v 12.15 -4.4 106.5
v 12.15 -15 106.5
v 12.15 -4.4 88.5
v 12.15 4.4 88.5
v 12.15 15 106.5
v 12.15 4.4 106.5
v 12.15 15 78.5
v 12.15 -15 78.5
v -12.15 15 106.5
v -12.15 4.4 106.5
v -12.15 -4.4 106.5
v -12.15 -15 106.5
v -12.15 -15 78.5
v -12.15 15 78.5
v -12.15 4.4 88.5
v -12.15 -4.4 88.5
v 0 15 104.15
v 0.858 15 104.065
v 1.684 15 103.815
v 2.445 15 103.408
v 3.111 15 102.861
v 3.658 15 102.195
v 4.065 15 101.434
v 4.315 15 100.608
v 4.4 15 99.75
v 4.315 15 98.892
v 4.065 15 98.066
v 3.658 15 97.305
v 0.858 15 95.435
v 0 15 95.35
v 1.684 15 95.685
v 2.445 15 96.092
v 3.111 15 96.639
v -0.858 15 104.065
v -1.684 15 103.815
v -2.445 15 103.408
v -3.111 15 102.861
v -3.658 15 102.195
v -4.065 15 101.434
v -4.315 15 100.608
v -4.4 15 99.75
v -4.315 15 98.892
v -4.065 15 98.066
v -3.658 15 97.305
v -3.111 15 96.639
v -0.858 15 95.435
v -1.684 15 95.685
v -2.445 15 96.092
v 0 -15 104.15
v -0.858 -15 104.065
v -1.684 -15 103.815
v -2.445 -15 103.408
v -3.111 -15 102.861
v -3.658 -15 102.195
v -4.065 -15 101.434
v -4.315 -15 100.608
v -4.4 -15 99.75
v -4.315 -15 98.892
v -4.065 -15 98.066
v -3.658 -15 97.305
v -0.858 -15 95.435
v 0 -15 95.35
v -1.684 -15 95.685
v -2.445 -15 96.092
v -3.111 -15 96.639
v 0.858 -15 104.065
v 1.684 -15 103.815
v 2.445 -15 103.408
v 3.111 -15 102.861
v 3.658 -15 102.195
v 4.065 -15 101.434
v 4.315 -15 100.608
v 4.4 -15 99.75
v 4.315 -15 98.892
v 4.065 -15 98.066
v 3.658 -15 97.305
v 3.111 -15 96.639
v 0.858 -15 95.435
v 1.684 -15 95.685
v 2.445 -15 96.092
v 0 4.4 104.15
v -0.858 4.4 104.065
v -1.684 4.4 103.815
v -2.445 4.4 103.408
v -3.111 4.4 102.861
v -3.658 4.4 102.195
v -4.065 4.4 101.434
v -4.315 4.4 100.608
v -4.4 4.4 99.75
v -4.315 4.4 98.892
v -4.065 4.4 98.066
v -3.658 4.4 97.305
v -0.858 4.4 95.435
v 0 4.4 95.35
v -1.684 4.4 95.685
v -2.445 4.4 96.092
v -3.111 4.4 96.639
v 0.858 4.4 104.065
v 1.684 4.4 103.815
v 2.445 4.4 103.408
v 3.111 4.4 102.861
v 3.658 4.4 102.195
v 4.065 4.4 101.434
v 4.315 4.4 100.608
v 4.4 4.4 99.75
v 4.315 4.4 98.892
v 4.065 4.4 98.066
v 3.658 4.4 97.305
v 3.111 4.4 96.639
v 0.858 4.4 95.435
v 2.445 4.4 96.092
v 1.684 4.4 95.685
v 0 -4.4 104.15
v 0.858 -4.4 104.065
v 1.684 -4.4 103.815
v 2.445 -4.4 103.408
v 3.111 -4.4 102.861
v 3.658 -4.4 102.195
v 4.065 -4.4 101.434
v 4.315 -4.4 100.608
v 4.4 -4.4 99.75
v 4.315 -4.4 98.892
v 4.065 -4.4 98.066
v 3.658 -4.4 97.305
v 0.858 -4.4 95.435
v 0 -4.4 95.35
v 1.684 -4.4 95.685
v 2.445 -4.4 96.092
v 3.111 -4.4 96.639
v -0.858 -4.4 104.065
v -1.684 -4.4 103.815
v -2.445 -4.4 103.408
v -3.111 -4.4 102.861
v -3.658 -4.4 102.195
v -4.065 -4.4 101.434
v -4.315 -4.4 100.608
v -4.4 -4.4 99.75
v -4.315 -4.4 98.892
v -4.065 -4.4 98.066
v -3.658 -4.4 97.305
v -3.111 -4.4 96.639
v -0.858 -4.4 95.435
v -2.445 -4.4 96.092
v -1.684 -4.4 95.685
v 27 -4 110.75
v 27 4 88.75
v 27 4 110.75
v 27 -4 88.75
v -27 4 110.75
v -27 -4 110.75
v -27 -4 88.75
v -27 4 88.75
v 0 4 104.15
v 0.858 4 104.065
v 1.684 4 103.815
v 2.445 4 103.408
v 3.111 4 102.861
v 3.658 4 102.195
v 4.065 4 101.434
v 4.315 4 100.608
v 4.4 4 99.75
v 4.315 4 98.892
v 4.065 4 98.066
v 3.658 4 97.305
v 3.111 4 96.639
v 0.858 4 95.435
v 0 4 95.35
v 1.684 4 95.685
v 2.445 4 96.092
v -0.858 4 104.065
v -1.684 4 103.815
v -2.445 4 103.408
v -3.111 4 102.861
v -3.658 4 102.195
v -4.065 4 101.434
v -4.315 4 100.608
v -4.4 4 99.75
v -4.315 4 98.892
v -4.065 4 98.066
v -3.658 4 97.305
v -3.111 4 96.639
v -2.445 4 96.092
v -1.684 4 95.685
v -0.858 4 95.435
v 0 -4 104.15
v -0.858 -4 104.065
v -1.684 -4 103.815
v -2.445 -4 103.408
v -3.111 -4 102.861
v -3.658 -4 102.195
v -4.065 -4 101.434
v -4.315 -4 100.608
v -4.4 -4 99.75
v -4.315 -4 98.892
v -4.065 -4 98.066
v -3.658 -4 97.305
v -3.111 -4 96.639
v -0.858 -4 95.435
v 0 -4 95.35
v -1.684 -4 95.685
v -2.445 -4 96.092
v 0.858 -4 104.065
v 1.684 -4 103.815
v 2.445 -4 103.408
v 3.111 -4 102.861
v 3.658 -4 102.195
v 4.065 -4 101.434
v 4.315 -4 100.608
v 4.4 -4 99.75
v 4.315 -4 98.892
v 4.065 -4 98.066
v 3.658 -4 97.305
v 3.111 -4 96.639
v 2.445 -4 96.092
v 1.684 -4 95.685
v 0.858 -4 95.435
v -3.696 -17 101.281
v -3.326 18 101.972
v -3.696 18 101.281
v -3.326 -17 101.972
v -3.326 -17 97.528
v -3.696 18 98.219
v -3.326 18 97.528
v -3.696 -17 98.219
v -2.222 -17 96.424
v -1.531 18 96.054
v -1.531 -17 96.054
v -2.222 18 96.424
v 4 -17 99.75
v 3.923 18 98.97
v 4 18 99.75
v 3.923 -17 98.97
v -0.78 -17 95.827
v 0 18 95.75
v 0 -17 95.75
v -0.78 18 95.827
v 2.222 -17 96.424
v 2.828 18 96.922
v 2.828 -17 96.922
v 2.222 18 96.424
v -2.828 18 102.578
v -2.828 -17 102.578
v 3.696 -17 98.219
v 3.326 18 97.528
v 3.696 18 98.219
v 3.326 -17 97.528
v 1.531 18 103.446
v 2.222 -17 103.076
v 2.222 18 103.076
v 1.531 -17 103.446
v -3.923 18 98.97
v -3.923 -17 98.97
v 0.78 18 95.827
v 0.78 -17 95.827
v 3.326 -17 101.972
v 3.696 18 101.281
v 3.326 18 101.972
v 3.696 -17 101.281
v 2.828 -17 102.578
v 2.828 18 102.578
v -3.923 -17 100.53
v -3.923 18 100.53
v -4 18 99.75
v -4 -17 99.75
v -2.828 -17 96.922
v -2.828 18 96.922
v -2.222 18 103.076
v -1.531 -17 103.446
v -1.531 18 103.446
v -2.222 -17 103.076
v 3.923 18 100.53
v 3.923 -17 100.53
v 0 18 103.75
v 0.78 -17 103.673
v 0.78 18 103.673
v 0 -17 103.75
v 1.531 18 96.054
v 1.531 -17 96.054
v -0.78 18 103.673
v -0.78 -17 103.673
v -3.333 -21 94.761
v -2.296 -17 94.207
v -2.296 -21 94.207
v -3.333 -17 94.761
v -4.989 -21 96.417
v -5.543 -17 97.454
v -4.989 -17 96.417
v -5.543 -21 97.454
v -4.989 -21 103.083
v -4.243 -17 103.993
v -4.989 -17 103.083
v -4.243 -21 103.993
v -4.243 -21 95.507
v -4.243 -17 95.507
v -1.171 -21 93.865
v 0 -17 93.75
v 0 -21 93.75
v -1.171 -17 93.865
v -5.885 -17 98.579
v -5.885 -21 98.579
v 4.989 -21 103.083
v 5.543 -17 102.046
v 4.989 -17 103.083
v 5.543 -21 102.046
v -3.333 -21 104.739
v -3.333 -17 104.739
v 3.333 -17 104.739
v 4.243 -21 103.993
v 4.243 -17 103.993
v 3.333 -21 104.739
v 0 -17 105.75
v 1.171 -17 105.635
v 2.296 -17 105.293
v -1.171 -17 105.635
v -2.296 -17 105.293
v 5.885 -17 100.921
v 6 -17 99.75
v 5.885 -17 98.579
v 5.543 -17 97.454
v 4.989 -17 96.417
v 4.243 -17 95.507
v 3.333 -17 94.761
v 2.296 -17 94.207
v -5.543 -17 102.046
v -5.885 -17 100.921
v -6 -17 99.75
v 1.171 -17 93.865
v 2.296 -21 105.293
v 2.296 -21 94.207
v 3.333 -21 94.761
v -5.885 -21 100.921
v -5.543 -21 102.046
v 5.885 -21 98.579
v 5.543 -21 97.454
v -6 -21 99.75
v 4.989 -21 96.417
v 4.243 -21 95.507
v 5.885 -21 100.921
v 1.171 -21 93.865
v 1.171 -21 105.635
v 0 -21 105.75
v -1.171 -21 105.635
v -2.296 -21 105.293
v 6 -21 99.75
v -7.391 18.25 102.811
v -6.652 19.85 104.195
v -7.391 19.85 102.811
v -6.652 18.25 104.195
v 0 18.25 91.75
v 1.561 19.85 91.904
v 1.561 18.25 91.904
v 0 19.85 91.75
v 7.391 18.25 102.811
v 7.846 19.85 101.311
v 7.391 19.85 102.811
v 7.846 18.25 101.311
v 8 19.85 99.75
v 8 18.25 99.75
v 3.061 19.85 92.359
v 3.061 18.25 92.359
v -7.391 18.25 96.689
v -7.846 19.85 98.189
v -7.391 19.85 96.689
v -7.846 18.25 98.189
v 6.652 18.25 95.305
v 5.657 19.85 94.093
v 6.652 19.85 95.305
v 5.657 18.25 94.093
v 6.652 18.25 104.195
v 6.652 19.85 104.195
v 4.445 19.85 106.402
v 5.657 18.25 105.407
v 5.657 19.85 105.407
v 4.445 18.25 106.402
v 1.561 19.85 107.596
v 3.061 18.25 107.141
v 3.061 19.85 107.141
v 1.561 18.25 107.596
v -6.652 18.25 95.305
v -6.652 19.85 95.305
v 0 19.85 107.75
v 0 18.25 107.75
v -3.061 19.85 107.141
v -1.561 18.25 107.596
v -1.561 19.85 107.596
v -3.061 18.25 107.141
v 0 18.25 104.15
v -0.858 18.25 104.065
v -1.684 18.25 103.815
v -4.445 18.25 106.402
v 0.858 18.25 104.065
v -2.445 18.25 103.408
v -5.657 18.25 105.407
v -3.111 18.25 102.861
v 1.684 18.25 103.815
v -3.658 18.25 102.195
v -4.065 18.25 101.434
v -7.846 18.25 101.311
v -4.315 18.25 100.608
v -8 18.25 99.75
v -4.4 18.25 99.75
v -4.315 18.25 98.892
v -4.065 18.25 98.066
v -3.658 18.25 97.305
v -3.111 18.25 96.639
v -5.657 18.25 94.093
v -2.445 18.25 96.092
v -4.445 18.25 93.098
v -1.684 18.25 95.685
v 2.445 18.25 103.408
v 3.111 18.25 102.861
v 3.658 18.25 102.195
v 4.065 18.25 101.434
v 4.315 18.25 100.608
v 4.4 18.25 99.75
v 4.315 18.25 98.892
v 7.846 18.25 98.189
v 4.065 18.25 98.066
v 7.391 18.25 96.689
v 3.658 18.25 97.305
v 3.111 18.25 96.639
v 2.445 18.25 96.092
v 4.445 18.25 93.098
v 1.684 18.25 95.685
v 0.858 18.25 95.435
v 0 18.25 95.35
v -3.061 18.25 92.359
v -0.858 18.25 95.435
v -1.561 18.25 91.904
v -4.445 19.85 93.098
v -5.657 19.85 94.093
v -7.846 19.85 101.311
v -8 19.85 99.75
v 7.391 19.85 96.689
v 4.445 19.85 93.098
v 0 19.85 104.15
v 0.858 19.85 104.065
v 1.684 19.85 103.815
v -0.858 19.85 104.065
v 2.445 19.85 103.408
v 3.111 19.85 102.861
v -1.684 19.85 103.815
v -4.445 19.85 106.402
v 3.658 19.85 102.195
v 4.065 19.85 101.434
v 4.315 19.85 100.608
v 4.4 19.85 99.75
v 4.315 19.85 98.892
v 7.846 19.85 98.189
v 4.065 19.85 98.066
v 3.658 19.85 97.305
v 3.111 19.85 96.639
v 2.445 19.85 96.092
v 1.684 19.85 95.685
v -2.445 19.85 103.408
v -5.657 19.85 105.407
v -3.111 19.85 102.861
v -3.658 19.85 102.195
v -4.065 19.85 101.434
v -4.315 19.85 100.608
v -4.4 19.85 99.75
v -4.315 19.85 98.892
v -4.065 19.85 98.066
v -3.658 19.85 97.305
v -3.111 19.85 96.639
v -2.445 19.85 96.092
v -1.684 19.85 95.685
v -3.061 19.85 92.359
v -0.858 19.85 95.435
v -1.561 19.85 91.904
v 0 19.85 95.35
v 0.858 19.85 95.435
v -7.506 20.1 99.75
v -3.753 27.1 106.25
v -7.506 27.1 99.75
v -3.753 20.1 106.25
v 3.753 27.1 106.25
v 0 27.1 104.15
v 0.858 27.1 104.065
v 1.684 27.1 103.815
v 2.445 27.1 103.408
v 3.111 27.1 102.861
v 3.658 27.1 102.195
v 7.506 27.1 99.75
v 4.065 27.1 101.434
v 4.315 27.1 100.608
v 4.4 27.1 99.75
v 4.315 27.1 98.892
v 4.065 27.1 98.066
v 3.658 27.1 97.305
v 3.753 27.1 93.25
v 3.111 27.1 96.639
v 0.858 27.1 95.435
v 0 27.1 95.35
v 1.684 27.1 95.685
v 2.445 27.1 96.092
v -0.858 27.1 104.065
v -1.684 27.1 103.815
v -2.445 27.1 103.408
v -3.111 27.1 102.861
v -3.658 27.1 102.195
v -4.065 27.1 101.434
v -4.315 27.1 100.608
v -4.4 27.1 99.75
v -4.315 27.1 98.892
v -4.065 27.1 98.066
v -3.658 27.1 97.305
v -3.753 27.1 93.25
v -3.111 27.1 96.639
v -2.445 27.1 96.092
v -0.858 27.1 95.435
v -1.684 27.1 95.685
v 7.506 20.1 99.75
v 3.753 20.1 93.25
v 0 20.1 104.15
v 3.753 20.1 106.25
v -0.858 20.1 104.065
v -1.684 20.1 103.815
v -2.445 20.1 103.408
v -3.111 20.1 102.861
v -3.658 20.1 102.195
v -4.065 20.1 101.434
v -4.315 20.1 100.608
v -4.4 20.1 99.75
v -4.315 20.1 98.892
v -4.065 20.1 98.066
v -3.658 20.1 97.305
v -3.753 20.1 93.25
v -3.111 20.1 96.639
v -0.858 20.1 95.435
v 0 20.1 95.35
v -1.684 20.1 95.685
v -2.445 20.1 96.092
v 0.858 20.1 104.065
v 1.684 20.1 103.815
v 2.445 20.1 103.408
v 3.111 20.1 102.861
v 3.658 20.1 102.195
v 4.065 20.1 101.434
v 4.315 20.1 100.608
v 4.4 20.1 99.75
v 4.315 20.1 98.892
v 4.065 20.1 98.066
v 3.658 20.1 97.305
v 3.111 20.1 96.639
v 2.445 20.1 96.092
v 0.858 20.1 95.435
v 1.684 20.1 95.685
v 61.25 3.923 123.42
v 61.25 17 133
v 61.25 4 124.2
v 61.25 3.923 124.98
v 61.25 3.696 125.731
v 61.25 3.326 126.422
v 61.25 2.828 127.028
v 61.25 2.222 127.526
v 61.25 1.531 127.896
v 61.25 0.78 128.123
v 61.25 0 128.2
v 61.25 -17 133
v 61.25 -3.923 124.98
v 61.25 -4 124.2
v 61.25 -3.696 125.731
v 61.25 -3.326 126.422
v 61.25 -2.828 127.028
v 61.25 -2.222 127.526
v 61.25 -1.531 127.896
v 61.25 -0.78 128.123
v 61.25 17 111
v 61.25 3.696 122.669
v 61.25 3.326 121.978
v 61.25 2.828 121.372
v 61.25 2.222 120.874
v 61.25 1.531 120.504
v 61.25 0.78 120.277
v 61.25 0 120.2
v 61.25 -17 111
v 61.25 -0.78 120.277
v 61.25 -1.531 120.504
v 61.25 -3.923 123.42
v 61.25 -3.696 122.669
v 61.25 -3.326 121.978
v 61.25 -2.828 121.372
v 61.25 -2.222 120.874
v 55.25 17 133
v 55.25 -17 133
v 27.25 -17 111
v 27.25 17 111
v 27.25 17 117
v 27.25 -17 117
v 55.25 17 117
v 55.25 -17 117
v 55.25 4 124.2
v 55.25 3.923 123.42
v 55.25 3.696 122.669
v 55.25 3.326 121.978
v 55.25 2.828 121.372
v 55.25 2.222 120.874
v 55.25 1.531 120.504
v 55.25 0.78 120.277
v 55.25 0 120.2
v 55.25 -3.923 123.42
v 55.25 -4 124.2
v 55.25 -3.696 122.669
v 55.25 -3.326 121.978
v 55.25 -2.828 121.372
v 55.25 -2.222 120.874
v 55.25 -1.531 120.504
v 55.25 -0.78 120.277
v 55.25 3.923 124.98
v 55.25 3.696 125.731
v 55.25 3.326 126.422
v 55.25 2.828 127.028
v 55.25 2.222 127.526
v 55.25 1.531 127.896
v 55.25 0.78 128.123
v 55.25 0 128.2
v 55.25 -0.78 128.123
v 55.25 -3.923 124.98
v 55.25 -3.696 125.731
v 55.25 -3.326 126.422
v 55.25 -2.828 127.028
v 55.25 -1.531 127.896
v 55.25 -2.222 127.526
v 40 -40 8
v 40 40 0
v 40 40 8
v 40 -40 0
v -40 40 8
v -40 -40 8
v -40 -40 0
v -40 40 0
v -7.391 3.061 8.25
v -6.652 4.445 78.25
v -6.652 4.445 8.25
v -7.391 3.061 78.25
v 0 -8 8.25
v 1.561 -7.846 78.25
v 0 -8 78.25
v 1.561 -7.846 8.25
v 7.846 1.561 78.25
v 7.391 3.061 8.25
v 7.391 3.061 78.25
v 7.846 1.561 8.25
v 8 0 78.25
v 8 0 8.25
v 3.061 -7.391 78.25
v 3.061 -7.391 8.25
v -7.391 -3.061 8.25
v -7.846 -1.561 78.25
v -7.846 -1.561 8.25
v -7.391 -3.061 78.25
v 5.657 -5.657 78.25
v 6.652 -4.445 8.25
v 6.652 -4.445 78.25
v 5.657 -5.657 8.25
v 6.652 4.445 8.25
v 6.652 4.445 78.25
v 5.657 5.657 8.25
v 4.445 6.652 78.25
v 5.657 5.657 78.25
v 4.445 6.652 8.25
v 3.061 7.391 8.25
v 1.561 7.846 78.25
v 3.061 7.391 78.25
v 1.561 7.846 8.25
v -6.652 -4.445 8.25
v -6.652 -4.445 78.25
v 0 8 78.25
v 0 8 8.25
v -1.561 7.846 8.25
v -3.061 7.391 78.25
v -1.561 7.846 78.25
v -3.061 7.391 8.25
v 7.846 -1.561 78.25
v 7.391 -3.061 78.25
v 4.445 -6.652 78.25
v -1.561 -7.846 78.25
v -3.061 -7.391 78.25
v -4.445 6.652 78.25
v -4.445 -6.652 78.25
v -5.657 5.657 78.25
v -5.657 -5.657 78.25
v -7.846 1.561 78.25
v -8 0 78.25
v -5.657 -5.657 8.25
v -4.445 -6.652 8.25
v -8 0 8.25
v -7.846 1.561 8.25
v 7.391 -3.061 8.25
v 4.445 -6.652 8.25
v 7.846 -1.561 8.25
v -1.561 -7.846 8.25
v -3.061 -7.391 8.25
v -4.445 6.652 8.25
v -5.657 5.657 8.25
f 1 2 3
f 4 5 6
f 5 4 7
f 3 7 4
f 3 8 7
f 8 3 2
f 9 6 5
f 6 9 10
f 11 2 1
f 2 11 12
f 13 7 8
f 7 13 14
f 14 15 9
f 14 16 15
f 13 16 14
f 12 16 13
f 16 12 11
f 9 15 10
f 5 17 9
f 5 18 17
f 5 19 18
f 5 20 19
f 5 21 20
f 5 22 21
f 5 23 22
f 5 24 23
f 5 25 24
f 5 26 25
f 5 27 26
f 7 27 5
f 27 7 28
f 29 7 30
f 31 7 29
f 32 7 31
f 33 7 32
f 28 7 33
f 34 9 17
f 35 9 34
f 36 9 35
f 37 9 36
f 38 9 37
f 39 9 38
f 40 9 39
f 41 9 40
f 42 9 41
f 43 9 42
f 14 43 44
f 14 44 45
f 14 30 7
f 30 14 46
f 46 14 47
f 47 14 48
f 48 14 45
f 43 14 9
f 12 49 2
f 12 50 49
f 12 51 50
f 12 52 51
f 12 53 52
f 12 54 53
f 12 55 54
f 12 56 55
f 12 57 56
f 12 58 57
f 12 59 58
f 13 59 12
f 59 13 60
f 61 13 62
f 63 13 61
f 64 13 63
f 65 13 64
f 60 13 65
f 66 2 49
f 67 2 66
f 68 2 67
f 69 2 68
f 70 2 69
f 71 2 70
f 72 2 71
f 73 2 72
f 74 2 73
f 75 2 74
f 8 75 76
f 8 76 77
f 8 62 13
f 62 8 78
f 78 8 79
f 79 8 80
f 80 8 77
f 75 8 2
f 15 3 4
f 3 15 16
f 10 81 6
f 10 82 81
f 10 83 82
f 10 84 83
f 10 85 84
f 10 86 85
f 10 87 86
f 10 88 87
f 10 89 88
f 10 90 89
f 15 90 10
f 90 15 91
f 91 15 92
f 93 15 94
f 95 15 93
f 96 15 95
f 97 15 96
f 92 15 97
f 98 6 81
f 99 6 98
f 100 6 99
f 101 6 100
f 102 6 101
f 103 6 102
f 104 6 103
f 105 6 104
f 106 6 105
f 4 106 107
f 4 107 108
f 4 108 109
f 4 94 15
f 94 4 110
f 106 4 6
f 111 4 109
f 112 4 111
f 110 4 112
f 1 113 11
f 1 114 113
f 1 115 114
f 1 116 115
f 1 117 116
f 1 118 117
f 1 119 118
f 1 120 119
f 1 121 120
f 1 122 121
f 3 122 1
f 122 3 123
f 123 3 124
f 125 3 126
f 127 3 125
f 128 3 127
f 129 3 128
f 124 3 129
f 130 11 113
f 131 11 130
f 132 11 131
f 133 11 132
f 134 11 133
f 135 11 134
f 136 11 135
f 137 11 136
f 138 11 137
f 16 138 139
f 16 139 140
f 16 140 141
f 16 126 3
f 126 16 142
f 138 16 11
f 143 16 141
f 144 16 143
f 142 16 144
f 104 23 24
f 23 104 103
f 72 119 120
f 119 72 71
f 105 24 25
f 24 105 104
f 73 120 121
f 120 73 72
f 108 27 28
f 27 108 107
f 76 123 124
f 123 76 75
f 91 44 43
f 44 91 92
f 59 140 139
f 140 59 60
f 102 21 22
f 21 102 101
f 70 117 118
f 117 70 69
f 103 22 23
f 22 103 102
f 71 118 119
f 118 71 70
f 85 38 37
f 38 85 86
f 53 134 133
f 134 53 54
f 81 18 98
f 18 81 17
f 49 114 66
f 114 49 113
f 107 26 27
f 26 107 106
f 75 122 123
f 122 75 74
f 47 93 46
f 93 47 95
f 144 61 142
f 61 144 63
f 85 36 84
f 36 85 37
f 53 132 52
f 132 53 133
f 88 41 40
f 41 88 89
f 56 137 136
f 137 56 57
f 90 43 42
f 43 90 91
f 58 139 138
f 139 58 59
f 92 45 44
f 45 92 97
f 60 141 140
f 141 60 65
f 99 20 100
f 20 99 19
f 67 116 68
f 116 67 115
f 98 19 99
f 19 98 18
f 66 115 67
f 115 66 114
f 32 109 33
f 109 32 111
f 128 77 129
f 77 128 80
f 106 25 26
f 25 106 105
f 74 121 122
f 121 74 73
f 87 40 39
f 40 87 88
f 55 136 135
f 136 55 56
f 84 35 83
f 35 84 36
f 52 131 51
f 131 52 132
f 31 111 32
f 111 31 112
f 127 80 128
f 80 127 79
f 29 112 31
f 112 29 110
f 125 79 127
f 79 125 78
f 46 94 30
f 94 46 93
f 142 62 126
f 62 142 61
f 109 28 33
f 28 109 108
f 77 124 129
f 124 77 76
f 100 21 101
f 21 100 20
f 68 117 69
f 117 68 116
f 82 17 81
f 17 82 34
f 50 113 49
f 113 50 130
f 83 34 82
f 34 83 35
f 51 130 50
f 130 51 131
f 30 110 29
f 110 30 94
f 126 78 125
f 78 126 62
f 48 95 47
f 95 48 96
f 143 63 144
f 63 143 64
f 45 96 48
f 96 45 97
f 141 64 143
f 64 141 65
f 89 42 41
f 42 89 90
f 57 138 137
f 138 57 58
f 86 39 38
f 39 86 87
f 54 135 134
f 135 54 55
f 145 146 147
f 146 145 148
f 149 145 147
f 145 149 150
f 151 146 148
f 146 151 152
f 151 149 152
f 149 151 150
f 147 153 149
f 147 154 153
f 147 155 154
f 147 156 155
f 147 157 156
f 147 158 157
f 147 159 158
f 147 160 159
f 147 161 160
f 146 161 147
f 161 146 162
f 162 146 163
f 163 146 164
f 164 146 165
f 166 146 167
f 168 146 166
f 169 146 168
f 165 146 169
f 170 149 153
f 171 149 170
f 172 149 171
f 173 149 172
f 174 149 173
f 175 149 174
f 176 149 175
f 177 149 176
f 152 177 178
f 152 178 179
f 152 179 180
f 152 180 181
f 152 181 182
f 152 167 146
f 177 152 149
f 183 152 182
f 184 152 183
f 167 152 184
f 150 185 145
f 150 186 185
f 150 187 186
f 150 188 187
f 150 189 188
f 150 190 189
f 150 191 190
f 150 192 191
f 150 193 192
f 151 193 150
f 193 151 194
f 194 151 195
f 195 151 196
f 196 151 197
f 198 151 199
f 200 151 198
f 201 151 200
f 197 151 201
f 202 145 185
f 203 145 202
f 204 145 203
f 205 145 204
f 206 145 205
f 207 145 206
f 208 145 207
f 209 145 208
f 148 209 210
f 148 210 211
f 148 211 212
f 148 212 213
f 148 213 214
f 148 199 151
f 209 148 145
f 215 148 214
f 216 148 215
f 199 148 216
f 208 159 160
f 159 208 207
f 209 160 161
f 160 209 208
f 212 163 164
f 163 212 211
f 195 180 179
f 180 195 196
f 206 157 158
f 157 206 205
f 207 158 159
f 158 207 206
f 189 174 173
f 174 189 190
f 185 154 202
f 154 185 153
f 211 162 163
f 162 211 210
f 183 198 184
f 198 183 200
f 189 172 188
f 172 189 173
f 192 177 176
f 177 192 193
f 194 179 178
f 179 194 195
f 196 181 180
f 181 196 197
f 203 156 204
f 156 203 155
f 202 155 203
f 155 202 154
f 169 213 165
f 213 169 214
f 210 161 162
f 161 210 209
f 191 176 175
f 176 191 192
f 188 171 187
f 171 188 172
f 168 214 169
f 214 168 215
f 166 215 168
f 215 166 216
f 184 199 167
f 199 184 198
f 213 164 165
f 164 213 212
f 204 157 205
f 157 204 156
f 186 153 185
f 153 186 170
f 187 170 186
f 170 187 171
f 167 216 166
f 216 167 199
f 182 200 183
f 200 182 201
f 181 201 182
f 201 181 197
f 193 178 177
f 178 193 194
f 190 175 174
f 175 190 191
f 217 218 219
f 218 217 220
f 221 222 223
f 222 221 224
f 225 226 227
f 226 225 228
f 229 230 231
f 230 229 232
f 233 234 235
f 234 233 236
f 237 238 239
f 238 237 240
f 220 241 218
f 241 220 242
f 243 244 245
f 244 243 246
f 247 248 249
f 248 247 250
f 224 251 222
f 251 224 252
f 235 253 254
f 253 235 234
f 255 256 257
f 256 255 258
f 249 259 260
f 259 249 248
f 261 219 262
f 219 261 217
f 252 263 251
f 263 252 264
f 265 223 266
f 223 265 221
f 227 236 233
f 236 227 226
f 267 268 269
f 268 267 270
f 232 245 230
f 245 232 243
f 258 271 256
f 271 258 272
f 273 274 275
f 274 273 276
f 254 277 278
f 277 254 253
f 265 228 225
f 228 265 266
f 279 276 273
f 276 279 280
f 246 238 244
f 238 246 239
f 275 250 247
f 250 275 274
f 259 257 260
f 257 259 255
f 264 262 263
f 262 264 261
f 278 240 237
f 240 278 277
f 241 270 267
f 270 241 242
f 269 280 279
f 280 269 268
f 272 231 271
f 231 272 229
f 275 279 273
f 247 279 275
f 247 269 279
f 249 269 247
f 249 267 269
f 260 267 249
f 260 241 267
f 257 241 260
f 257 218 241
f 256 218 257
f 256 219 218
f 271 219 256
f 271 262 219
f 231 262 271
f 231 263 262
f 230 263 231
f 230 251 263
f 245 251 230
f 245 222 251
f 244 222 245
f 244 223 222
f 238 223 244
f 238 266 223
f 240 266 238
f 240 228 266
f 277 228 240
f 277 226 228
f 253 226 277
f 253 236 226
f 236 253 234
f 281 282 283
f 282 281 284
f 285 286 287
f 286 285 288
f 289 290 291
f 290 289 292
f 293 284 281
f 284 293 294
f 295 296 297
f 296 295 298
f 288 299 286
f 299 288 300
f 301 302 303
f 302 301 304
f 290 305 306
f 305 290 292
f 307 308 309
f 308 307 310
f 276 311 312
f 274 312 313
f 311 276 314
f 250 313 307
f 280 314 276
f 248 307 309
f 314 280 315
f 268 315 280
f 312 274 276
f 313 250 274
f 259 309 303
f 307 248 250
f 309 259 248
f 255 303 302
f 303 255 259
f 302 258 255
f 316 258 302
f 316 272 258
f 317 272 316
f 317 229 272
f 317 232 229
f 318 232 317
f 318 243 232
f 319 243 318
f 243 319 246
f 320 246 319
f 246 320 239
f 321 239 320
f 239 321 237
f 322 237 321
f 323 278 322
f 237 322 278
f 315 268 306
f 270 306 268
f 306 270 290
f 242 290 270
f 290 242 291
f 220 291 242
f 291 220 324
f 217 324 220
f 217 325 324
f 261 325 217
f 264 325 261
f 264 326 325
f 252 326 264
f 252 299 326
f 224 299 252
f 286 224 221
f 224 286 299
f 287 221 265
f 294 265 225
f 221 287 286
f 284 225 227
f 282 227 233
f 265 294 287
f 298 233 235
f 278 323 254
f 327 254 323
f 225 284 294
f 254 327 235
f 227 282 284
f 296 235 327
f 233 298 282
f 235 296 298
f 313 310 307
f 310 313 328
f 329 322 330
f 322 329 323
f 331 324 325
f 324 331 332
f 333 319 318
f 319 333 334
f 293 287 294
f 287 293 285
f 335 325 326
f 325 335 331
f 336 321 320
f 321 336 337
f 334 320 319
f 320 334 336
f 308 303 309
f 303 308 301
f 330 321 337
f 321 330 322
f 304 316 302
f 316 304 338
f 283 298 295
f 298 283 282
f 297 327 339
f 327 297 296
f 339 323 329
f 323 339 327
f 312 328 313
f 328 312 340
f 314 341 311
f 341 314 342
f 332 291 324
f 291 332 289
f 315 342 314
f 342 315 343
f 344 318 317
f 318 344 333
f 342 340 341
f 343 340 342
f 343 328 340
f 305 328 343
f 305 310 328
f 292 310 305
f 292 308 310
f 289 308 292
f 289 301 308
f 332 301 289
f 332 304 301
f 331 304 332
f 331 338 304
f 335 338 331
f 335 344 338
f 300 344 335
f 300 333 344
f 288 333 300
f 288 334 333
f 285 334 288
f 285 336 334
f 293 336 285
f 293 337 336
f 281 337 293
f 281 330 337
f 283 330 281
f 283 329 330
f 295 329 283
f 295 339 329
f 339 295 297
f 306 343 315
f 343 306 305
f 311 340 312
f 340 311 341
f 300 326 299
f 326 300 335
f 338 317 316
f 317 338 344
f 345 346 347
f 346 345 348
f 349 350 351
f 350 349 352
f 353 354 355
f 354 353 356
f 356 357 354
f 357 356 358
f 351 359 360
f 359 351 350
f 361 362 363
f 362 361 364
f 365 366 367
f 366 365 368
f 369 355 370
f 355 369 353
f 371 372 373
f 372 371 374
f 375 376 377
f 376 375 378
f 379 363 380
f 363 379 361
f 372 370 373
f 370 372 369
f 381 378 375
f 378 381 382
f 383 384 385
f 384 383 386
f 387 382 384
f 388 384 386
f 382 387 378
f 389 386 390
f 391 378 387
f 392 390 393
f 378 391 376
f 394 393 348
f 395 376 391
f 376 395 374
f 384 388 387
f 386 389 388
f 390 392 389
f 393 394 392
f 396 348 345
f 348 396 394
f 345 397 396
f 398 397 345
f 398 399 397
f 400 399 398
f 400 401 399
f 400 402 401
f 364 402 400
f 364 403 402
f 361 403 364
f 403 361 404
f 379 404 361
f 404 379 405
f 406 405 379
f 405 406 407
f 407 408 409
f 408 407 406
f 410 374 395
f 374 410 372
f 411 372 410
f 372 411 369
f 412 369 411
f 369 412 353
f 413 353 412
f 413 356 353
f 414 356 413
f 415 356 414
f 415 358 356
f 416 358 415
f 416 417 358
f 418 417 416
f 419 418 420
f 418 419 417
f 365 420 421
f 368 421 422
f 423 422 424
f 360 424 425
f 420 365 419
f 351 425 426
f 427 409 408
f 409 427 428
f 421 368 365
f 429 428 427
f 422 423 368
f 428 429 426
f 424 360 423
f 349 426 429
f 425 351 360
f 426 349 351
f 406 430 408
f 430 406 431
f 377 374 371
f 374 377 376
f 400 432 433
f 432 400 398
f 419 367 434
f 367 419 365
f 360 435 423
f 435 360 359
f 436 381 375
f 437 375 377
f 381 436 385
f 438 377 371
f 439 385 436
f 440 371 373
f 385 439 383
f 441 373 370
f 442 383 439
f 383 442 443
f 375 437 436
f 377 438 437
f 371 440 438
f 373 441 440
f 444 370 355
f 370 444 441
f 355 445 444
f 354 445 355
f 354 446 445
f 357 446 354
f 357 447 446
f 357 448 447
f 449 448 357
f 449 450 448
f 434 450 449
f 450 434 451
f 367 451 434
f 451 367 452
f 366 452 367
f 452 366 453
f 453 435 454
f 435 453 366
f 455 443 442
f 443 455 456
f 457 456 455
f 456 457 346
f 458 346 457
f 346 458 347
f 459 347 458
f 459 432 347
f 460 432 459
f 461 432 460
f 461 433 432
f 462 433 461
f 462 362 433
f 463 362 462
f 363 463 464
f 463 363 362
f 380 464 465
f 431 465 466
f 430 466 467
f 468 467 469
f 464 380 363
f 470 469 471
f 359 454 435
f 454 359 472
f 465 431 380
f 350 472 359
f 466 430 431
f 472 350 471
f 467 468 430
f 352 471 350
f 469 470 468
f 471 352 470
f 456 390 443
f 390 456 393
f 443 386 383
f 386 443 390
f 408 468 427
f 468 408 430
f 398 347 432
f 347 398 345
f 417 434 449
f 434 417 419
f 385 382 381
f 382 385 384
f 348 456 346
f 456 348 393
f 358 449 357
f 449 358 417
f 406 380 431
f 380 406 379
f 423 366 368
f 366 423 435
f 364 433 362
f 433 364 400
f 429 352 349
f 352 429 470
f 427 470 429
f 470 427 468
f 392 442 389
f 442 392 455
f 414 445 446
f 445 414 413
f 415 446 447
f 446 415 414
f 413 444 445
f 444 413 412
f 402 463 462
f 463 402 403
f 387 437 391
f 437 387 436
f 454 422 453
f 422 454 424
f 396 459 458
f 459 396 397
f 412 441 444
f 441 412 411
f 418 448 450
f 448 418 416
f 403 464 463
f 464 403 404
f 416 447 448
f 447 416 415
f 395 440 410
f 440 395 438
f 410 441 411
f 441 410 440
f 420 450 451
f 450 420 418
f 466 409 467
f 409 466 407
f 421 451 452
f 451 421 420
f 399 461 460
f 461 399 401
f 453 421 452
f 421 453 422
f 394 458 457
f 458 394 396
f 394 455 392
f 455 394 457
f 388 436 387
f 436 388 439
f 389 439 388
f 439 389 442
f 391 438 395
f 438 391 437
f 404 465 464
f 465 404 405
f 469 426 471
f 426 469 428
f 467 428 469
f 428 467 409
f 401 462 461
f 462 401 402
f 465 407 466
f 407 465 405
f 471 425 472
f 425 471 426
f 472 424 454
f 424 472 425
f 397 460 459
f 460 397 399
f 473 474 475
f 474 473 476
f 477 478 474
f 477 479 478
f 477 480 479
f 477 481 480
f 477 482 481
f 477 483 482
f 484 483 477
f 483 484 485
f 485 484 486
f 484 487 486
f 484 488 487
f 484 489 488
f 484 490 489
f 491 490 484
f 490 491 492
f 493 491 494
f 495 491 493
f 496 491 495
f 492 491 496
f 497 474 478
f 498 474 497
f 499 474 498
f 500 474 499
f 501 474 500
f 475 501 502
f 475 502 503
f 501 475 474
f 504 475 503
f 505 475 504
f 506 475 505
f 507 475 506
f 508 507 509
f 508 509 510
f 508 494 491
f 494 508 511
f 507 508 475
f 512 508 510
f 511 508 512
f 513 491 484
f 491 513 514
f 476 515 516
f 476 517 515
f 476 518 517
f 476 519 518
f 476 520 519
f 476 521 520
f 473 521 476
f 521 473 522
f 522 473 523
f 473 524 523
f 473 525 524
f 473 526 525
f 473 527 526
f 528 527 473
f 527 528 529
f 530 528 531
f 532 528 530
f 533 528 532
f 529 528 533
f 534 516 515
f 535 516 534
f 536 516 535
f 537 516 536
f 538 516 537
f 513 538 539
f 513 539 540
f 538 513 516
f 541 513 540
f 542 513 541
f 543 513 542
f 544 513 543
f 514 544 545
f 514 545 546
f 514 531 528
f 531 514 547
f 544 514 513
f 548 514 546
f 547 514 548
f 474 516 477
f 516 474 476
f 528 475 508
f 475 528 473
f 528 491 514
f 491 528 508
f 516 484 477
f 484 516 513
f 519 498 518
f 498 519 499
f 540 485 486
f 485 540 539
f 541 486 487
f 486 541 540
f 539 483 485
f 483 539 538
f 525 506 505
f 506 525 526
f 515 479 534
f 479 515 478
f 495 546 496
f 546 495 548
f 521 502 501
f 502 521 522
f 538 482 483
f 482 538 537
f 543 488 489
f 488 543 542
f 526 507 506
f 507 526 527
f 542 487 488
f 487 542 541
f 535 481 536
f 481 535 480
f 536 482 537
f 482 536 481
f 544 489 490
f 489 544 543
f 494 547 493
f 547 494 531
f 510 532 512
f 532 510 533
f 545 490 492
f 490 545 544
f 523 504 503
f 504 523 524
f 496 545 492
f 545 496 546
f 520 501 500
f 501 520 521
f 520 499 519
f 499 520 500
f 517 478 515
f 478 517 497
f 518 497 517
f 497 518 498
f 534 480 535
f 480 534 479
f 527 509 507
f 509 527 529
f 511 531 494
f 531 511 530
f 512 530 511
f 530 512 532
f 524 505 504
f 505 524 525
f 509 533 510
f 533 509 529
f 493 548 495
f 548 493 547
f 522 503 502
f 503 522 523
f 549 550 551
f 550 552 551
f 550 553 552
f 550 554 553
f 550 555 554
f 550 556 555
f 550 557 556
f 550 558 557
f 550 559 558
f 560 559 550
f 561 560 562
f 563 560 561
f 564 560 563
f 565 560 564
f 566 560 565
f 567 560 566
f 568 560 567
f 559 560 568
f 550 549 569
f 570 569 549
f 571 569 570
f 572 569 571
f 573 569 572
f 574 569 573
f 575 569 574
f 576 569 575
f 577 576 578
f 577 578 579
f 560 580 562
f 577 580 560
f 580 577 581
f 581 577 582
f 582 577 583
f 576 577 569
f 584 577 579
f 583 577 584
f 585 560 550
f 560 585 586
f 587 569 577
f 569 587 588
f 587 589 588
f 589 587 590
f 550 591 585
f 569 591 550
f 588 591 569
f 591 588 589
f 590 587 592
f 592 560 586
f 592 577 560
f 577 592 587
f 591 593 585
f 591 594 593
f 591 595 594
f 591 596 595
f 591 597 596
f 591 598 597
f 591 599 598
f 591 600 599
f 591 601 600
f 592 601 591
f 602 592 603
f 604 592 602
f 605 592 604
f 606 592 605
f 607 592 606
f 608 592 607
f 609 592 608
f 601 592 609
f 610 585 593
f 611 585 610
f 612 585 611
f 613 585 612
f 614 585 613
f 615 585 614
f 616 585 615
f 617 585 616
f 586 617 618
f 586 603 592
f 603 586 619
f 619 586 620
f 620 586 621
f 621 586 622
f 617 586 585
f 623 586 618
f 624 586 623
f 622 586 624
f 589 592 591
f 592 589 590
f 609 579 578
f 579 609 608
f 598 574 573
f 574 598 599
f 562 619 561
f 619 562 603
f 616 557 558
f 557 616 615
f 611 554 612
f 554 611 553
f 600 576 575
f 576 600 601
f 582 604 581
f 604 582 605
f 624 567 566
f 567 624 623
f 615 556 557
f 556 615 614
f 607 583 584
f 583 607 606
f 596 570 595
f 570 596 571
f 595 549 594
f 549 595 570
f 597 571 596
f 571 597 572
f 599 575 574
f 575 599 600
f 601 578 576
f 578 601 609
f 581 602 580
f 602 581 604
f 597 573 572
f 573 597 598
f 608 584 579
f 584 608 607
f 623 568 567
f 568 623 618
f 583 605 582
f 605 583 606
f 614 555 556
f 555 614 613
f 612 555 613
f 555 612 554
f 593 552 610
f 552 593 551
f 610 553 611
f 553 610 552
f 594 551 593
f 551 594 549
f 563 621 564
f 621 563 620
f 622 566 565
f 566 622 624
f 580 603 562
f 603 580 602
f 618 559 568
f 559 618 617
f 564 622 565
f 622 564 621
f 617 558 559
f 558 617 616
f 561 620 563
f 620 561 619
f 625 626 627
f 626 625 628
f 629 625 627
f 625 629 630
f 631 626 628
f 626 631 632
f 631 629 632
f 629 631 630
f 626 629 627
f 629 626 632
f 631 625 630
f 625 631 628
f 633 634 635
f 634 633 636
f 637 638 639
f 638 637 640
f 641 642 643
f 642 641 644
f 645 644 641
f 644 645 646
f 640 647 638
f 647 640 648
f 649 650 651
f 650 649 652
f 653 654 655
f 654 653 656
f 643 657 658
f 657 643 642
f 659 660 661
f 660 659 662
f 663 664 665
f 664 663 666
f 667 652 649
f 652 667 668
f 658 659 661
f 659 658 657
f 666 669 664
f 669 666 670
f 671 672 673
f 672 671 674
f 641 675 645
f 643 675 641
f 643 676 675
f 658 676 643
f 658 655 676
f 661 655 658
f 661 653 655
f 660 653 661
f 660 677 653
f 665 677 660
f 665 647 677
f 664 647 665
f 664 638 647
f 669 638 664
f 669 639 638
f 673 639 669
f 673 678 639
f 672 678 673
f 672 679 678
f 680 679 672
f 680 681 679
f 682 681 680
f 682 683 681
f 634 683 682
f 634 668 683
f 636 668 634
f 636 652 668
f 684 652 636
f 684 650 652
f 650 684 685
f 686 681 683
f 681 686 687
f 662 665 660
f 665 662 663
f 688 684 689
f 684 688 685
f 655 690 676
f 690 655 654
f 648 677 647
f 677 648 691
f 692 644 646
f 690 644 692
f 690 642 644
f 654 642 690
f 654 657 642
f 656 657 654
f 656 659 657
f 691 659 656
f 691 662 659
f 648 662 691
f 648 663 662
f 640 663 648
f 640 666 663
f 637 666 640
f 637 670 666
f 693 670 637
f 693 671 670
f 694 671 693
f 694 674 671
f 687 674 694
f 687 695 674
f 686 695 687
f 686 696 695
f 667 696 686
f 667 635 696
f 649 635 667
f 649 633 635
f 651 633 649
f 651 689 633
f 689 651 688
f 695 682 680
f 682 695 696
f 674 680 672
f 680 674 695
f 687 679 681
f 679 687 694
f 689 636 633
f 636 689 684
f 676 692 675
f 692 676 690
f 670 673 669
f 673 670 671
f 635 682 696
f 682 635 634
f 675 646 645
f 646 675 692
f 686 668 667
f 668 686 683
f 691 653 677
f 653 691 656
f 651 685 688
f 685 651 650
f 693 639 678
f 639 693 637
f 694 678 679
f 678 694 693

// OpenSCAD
$fn = 32;

// ------------------------------------------------------------------------
// Lamp arm: column d16 x 70 mm, arm 54 mm
// Every part is its own module, assembly() places every instance.
// ------------------------------------------------------------------------

// --- part 1 ---
module lamp_base() {
  difference() {
    translate([-40, -40, 0]) cube([80, 80, 8]);
  }
}

// --- part 2 ---
module lamp_column() {
  cylinder(h = 70, d = 16);
}

// --- part 3 ---
module head_fork() {
  difference() {
    translate([-12.15, -15, 0]) cube([24.3, 30, 28]);
    translate([-13.15, -4.4, 10]) cube([26.3, 8.8, 19]);
    translate([0, 0, 21.25]) rotate([90, 0, 0]) cylinder(h = 32, d = 8.8, center = true);
  }
}

// --- part 4 ---
module lamp_arm() {
  difference() {
    translate([-27, -4, 0]) cube([54, 8, 22]);
    translate([0, 0, 11]) rotate([90, 0, 0]) cylinder(h = 10, d = 8.8, center = true);
  }
}

// --- part 5 ---
module arm_pin() {
  rotate([0, 90, 0]) cylinder(h = 36, d = 8, center = true);
  translate([-21, 0, 0]) rotate([0, 90, 0]) cylinder(h = 4, d = 12);
}

// --- part 6 ---
module arm_washer() {
  difference() {
      translate([0, 0, 0]) cylinder(h = 1.6, d = 16);
      translate([0, 0, -1]) cylinder(h = 3.6, d = 8.8);
    }
}

// --- part 7 ---
module arm_nut() {
  difference() {
    linear_extrude(height = 7) polygon(points = [[7.506, 0], [3.753, 6.5], [-3.753, 6.5], [-7.506, 0], [-3.753, -6.5], [3.753, -6.5]]);
    translate([0, 0, -1]) cylinder(h = 9, d = 8.8);
  }
}

// --- part 8 ---
module shade_bracket() {
  difference() {
    translate([-17, -17, 0]) cube([34, 34, 22]);
    translate([-18, -18, 6]) cube([29, 36, 17]);
    translate([14, 0, 13.2]) rotate([0, 90, 0]) cylinder(h = 8, d = 8, center = true);
  }
}

// --- assembly ---
module assembly() {
  color([0.80, 0.24, 0.20]) translate([0, 0, 0]) rotate([0, 0, 0]) lamp_base();
  color([0.20, 0.45, 0.75]) translate([0, 0, 8.25]) rotate([0, 0, 0]) lamp_column();
  color([0.25, 0.62, 0.32]) translate([0, 0, 78.5]) rotate([0, 0, 0]) head_fork();
  color([0.92, 0.70, 0.18]) translate([0, 0, 88.75]) rotate([0, 0, 0]) lamp_arm();
  color([0.58, 0.35, 0.70]) translate([0, 0, 99.75]) rotate([0, 0, 90]) arm_pin();
  color([0.16, 0.66, 0.66]) translate([0, 19.85, 99.75]) rotate([90, 0, 0]) arm_washer();
  color([0.85, 0.48, 0.18]) translate([0, 27.1, 99.75]) rotate([90, 0, 0]) arm_nut();
  color([0.55, 0.60, 0.65]) translate([44.25, 0, 111]) rotate([0, 0, 0]) shade_bracket();
}

assembly();
